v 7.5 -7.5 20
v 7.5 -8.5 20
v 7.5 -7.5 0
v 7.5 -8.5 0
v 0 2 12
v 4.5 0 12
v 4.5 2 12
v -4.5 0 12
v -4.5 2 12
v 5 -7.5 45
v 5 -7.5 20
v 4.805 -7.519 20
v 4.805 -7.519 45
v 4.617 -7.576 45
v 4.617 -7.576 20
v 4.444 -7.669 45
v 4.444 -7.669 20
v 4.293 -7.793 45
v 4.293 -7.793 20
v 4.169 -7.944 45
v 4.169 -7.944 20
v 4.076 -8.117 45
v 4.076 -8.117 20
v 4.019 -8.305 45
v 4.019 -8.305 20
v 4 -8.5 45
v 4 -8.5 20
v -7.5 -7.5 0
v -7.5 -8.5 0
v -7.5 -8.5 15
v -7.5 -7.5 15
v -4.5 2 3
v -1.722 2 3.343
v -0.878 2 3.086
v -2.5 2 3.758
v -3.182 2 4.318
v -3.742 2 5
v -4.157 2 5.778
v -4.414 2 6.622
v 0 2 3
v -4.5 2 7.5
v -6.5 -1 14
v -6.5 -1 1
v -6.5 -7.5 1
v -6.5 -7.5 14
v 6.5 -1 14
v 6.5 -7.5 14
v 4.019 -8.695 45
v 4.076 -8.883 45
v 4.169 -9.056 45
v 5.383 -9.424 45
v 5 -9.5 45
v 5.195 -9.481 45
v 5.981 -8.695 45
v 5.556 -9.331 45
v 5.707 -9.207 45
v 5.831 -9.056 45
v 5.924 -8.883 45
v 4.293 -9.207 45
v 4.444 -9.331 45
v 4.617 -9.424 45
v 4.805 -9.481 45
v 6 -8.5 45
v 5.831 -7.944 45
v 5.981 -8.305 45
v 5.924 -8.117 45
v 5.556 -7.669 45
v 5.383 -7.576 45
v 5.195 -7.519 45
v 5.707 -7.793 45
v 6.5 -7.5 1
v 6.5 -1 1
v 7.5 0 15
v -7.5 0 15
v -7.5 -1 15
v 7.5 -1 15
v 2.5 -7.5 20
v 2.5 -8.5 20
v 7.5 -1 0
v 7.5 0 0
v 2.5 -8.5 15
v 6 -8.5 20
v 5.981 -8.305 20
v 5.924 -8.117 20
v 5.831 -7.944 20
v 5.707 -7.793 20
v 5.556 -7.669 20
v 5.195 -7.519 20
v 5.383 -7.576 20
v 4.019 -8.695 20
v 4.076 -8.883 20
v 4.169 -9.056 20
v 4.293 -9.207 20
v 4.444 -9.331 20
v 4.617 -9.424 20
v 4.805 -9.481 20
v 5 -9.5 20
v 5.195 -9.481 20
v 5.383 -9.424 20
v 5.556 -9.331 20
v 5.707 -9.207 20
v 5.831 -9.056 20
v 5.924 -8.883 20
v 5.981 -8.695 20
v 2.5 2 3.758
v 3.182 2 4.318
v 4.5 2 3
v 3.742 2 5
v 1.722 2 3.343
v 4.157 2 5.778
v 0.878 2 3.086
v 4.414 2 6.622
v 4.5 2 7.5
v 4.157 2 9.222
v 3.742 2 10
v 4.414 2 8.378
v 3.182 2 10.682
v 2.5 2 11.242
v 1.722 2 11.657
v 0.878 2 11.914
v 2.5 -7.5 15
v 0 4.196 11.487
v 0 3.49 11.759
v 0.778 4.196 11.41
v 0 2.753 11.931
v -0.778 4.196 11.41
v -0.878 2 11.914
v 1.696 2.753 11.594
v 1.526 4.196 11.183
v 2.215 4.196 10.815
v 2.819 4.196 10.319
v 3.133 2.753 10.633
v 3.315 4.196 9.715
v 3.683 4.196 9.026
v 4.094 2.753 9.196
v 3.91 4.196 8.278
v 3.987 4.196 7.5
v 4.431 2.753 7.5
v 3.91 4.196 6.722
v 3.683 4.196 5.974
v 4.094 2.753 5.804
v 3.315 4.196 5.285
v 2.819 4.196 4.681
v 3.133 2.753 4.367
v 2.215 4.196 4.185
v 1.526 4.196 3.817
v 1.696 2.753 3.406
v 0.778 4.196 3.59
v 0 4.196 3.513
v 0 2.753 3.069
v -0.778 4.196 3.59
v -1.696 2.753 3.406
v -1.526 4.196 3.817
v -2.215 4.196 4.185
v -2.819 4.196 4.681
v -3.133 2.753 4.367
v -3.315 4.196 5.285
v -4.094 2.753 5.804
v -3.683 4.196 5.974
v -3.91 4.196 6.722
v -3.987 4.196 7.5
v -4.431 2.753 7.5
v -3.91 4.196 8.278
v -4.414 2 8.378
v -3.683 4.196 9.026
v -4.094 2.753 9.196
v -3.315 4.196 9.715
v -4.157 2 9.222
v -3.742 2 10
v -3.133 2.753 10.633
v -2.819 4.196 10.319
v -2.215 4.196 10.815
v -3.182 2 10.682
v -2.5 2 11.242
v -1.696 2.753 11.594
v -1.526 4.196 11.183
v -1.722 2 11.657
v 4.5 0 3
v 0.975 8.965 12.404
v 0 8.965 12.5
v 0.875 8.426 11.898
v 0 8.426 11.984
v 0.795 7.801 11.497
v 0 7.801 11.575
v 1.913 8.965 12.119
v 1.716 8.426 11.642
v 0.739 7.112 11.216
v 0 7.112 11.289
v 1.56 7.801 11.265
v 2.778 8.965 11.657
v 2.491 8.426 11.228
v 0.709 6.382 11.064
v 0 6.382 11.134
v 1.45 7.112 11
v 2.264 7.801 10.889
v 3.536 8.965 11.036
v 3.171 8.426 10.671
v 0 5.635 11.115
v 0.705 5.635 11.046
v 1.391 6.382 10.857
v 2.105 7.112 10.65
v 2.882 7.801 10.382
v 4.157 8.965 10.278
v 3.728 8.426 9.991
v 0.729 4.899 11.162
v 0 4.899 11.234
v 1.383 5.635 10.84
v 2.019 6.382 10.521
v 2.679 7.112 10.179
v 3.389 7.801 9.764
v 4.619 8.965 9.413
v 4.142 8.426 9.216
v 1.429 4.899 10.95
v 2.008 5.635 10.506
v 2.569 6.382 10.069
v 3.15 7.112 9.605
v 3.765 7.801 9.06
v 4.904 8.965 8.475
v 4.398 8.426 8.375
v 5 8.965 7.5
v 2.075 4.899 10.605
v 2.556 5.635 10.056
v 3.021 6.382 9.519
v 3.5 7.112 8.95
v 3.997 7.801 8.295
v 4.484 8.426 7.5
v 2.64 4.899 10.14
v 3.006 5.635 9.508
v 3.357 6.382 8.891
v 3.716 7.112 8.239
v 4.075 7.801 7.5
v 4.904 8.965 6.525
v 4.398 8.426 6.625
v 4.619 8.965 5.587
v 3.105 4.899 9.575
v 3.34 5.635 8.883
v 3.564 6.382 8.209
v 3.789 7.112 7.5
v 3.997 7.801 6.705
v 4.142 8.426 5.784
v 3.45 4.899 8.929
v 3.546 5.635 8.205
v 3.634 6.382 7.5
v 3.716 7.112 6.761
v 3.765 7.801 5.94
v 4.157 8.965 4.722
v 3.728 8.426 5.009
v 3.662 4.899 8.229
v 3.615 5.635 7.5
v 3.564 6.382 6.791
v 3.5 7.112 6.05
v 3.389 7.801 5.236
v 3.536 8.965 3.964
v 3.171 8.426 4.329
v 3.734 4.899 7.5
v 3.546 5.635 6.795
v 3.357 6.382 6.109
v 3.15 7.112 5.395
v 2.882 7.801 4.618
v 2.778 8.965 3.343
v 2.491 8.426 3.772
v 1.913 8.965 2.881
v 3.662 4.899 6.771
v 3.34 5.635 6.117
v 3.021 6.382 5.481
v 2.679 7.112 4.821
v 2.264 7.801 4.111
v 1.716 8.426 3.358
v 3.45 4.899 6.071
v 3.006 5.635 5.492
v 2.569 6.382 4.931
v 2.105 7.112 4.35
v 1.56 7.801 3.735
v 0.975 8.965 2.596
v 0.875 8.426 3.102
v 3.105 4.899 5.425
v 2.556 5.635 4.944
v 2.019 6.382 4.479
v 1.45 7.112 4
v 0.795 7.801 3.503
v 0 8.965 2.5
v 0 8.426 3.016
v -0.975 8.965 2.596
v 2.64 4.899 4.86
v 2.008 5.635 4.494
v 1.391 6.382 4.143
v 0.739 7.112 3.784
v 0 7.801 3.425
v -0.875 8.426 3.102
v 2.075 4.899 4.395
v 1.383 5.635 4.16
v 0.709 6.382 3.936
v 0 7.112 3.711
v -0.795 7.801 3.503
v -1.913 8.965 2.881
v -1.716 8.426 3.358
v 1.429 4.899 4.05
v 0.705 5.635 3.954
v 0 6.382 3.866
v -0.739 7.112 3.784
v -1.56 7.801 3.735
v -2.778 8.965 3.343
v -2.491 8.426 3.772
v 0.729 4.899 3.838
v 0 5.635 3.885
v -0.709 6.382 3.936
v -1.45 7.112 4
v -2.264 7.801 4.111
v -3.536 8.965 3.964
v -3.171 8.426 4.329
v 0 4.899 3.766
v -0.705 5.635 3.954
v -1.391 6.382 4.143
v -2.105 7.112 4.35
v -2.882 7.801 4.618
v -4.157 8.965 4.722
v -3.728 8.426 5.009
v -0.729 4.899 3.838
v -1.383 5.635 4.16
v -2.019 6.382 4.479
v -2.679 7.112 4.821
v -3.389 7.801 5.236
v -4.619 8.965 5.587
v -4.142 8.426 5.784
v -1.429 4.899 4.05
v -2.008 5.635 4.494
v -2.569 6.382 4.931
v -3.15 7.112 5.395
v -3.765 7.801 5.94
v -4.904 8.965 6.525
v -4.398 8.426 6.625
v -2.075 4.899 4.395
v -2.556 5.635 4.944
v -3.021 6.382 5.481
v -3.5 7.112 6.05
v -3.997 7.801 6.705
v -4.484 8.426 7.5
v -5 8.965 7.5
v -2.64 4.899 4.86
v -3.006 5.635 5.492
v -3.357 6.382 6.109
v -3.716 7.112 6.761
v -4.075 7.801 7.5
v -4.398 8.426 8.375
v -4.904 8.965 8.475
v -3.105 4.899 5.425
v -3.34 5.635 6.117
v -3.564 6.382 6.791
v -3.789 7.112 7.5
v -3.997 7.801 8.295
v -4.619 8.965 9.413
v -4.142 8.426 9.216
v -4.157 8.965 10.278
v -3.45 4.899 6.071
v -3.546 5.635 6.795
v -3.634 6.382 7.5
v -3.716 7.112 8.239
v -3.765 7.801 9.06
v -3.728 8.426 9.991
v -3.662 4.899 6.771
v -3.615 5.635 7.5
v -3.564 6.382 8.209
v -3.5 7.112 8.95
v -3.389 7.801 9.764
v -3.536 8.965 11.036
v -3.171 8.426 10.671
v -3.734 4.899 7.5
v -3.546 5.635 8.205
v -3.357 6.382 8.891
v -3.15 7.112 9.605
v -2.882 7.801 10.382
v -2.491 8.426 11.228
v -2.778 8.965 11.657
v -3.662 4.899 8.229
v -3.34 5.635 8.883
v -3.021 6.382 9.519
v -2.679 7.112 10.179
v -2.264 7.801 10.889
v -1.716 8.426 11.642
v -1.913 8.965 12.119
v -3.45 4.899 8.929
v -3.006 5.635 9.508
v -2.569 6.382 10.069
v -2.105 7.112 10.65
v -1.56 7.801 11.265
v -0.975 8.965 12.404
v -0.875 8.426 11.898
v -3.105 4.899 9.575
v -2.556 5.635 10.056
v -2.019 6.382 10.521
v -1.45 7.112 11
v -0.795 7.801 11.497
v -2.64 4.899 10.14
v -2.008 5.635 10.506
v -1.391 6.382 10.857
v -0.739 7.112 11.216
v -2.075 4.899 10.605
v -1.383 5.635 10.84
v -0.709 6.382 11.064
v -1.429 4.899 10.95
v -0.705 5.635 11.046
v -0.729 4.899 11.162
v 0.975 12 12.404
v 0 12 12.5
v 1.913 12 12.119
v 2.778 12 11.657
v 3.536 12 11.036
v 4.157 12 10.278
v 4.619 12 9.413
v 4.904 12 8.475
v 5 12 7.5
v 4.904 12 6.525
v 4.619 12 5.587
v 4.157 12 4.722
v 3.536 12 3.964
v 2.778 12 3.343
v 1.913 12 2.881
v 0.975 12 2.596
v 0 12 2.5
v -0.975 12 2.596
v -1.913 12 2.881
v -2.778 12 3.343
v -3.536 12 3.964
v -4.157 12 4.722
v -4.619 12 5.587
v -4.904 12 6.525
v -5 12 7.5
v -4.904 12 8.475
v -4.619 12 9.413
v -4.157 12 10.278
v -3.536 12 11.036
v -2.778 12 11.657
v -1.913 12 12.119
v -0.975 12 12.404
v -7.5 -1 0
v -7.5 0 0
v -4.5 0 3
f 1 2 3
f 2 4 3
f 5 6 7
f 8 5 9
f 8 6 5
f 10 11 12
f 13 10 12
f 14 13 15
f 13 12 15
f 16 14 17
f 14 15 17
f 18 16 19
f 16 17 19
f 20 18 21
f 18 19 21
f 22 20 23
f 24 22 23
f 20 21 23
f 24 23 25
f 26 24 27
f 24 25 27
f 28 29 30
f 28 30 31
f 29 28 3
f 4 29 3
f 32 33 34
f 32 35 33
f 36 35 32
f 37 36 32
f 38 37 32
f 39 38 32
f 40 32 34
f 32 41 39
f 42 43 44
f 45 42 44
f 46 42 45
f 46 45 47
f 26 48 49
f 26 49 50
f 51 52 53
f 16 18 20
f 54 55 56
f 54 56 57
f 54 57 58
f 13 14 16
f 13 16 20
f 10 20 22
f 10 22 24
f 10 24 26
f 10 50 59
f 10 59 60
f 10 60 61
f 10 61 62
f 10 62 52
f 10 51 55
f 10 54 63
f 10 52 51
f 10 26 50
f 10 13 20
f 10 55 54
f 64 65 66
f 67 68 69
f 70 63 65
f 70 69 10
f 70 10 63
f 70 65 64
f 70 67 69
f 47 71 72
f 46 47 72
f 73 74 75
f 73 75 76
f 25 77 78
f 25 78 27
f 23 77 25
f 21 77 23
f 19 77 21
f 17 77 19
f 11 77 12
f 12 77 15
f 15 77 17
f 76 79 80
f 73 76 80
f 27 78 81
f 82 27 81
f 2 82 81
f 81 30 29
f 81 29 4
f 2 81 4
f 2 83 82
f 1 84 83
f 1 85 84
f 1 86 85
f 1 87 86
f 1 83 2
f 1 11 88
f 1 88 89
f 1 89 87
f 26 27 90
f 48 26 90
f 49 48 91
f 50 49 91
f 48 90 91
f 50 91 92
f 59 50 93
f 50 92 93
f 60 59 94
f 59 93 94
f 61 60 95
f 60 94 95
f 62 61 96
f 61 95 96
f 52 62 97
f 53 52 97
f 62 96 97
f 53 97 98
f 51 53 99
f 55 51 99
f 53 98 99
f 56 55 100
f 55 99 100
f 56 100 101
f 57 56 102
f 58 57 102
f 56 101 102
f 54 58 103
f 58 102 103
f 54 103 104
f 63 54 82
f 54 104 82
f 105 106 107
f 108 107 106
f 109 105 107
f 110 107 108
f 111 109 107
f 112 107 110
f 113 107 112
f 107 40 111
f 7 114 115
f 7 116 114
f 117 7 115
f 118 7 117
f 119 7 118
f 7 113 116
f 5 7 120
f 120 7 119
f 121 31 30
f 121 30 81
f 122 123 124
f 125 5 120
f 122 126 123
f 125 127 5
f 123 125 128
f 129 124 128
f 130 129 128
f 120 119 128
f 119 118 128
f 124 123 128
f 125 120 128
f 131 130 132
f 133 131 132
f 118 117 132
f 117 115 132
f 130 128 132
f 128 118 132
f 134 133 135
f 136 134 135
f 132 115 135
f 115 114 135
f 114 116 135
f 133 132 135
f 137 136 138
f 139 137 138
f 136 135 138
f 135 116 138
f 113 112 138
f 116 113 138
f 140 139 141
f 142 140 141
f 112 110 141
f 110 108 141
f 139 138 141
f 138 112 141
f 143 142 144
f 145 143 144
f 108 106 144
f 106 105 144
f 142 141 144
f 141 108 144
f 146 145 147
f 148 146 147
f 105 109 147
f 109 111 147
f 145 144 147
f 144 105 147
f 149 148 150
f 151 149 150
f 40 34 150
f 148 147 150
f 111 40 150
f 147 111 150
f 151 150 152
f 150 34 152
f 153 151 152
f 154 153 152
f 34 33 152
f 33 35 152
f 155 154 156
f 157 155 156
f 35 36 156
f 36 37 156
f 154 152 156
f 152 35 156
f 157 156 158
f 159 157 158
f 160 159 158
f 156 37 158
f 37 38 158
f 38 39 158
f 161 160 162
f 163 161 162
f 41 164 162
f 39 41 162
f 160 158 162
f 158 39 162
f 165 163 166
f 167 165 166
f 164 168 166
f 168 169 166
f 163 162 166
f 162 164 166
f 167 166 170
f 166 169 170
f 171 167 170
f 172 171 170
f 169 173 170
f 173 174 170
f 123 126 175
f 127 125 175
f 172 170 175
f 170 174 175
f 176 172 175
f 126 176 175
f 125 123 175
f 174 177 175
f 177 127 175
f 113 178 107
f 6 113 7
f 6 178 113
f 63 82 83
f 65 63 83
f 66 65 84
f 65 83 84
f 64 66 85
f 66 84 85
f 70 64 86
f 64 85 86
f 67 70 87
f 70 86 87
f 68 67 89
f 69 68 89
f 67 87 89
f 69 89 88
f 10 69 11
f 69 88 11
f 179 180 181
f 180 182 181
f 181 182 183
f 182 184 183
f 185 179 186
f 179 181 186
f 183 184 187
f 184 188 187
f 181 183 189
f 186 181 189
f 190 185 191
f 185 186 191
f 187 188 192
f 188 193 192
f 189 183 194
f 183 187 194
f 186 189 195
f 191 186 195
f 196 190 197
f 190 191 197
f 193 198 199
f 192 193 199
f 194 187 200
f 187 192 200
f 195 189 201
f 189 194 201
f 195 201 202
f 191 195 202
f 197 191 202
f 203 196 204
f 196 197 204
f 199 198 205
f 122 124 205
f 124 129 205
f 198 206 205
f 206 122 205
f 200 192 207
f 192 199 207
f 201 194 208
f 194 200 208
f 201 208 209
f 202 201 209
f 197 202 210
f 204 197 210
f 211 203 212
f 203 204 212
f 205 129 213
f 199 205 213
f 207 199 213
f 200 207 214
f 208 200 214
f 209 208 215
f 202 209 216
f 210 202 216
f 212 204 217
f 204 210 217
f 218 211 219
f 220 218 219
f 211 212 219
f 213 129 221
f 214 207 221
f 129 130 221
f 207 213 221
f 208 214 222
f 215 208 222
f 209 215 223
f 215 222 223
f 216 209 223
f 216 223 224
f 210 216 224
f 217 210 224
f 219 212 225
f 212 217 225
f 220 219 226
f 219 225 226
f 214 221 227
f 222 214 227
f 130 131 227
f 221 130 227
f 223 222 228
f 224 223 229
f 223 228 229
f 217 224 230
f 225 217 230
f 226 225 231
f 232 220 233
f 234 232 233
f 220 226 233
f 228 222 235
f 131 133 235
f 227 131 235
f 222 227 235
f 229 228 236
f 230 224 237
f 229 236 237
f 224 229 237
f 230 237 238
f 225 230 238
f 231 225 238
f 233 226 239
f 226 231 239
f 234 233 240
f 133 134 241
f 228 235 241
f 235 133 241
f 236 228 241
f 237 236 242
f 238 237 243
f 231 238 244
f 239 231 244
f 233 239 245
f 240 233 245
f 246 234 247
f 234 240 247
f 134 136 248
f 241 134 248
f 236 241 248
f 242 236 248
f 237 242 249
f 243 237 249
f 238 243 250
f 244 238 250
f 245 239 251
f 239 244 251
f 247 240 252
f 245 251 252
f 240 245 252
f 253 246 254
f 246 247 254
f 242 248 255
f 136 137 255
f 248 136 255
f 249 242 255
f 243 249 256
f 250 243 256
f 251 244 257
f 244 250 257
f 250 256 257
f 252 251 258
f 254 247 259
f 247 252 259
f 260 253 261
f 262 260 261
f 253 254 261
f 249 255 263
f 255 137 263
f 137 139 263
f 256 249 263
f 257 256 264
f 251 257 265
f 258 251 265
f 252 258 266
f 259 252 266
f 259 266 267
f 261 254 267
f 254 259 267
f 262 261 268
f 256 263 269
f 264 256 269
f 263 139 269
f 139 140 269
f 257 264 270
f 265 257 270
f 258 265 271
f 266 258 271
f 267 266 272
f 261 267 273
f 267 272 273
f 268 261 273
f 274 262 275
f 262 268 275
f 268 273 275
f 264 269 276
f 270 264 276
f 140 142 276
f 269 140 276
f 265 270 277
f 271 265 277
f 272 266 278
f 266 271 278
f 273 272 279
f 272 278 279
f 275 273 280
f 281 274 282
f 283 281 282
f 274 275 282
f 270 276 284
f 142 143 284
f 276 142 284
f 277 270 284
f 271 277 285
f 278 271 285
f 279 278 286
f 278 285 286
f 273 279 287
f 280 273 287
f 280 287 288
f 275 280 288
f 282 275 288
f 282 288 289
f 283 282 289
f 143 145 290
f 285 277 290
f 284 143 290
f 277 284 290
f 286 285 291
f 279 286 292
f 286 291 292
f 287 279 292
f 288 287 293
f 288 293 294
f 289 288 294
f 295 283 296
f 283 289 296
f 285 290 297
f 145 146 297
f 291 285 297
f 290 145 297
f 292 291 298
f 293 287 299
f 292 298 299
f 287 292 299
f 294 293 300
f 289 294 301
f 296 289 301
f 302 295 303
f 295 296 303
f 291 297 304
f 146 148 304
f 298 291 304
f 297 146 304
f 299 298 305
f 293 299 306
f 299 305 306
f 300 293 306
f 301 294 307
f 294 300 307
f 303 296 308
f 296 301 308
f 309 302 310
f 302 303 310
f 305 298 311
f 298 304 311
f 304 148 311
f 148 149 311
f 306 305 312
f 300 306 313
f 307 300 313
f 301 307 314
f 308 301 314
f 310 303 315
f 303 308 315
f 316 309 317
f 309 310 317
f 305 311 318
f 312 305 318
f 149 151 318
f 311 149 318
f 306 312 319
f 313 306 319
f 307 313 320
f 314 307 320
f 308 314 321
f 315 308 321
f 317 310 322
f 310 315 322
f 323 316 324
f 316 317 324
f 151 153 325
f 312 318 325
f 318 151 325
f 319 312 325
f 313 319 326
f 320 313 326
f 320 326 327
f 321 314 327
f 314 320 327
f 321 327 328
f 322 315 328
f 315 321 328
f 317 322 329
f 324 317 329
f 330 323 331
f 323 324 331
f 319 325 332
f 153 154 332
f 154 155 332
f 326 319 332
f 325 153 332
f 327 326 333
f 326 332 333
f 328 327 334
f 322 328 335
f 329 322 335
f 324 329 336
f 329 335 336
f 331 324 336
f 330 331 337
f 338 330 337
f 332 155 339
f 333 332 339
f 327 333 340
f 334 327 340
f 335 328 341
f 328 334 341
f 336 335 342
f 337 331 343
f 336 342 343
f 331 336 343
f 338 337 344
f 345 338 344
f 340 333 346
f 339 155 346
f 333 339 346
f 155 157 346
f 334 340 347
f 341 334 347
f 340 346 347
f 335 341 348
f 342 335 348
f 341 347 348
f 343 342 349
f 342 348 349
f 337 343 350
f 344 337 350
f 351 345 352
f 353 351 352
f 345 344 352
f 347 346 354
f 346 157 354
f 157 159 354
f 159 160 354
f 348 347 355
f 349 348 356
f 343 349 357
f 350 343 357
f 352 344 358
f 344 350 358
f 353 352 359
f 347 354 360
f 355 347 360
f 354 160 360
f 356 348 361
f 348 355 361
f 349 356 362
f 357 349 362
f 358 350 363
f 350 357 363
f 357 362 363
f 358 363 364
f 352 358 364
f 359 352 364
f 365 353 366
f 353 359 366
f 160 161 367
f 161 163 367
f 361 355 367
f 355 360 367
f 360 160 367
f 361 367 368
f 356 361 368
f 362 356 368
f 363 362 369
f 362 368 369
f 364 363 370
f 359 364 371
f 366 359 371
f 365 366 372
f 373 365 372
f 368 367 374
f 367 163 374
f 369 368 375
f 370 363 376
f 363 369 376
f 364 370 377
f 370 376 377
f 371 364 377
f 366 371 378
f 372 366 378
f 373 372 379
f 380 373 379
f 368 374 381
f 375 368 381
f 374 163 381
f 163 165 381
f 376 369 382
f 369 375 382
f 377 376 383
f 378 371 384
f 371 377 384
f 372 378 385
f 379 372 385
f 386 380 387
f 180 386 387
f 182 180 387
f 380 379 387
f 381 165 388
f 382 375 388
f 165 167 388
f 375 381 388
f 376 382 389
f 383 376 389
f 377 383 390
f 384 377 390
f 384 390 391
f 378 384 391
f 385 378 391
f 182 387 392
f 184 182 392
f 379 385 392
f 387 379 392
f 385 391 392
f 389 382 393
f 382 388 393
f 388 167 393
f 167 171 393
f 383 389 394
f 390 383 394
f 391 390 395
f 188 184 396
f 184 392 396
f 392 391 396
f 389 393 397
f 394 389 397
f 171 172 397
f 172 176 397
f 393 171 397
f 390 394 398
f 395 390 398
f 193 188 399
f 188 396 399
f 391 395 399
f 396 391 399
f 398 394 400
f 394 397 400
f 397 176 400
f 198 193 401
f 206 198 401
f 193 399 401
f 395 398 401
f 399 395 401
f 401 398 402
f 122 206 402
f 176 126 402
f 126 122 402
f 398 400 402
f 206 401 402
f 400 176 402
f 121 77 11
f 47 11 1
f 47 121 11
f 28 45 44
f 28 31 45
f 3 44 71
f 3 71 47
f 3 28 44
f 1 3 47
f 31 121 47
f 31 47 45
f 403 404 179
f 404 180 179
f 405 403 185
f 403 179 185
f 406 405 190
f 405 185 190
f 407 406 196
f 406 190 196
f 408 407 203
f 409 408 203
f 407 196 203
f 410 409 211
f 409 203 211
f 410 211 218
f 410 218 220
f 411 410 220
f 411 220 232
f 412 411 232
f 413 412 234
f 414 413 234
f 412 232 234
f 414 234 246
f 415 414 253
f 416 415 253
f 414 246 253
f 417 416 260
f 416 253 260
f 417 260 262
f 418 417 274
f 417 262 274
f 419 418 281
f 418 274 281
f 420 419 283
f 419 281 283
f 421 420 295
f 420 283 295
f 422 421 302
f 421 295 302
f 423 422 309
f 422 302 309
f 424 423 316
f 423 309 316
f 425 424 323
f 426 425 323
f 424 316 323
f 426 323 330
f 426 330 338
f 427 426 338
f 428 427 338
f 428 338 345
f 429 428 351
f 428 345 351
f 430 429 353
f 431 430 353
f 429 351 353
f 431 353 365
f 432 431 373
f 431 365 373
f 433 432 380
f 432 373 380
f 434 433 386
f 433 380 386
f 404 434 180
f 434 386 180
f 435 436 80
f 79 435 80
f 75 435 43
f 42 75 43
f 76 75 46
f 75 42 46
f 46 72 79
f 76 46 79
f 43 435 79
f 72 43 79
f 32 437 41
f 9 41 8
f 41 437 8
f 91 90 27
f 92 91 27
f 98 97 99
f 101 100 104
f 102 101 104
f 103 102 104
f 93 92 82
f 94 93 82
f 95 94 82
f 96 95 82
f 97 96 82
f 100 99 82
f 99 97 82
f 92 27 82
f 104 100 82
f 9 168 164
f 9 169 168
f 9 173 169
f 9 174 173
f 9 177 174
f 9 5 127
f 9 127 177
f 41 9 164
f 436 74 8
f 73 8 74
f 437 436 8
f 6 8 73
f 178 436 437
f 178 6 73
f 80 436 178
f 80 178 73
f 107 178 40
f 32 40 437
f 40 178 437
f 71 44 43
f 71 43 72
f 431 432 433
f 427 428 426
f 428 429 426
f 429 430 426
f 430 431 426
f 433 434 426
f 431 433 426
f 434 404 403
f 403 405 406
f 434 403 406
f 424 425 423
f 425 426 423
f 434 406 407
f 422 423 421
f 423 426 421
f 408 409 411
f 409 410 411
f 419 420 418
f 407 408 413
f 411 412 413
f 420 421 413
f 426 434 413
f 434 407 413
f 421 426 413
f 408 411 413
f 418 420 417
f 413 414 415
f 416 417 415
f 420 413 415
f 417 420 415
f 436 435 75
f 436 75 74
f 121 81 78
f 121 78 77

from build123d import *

# Parameters (mm, degrees)
F0_W      = 15
F0_H      = 8.5
F1_DEPTH  = 15
F2_W      = 15
F2_H      = 6.5
F3_DEPTH  = 1
F4_W      = 6.5
F4_H      = 14
F5_DEPTH  = 1
F6_W      = 14
F6_H      = 6.5
F7_DEPTH  = 1
F8_W      = 6.5
F8_H      = 13
F9_DEPTH  = 1
F10_W     = 5
F10_H     = 1
F11_DEPTH = 5
F12_W     = 9
F12_H     = 9
F13_DEPTH = 2
F17_DEPTH = 25


with BuildPart() as f1:
    # F0 (on Top) → F1 (new body)
    with BuildSketch(Plane.XY):
        with Locations((0, -4.25)):
            Rectangle(F0_W, F0_H)
    extrude(amount=F1_DEPTH)

    # F2 (on face) → F3 (cut)
    with BuildSketch(Plane.XY.offset(15)):
        with Locations((0, -4.25)):
            Rectangle(F2_W, F2_H)
    extrude(amount=-F3_DEPTH, mode=Mode.SUBTRACT)

    # F4 (on face) → F5 (cut)
    with BuildSketch(Plane.YZ.offset(7.5)):
        with Locations((-4.25, 7)):
            Rectangle(F4_W, F4_H)
    extrude(amount=-F5_DEPTH, mode=Mode.SUBTRACT)

    # F6 (on face) → F7 (cut)
    with BuildSketch(Plane(origin=(0, 0, 0), x_dir=(1, 0, 0), z_dir=(0, 0, -1))):
        with Locations((-0.5, 4.25)):
            Rectangle(F6_W, F6_H)
    extrude(amount=-F7_DEPTH, mode=Mode.SUBTRACT)

    # F8 (on face) → F9 (cut)
    with BuildSketch(Plane(origin=(-7.5, 0, 0), x_dir=(0, -1, 0), z_dir=(-1, 0, 0))):
        with Locations((4.25, 7.5)):
            Rectangle(F8_W, F8_H)
    extrude(amount=-F9_DEPTH, mode=Mode.SUBTRACT)

    # F10 (on face) → F11 (join)
    with BuildSketch(Plane.XY.offset(15)):
        with Locations((5, -8)):
            Rectangle(F10_W, F10_H)
    extrude(amount=F11_DEPTH)

    # F12 (on face) → F13 (join)
    with BuildSketch(Plane(origin=(0, 0, 0), x_dir=(-1, 0, 0), z_dir=(0, 1, 0))):
        with Locations((0, 7.5)):
            Rectangle(F12_W, F12_H)
    extrude(amount=F13_DEPTH)

    # F14 (on Right) → F15 (revolve)
    with BuildSketch(Plane.YZ):
        with BuildLine():
            ThreePointArc((4.196024, 11.486574), (3.124753, 11.857664), (2, 12))
            Line((2, 12), (2, 7.5))
            Line((2, 7.5), (12, 7.5))
            Line((12, 7.5), (12, 12.5))
            Line((12, 12.5), (8.965219, 12.5))
            ThreePointArc((8.965219, 12.5), (6.750409, 11.194264), (4.196024, 11.486574))
        make_face()
    revolve(axis=Axis((0, 7, 7.5), (0, 1, 0)))

    # F16 (on face) → F17 (join)
    with BuildSketch(Plane.XY.offset(20)):
        with BuildLine():
            Line((4, -8.5), (6, -8.5))
            ThreePointArc((6, -8.5), (5.707107, -7.792893), (5, -7.5))
            ThreePointArc((5, -7.5), (4.292893, -7.792893), (4, -8.5))
        make_face()
        with BuildLine():
            ThreePointArc((4, -8.5), (5, -9.5), (6, -8.5))
            Line((6, -8.5), (4, -8.5))
        make_face()
    extrude(amount=F17_DEPTH)


solid = f1.part
